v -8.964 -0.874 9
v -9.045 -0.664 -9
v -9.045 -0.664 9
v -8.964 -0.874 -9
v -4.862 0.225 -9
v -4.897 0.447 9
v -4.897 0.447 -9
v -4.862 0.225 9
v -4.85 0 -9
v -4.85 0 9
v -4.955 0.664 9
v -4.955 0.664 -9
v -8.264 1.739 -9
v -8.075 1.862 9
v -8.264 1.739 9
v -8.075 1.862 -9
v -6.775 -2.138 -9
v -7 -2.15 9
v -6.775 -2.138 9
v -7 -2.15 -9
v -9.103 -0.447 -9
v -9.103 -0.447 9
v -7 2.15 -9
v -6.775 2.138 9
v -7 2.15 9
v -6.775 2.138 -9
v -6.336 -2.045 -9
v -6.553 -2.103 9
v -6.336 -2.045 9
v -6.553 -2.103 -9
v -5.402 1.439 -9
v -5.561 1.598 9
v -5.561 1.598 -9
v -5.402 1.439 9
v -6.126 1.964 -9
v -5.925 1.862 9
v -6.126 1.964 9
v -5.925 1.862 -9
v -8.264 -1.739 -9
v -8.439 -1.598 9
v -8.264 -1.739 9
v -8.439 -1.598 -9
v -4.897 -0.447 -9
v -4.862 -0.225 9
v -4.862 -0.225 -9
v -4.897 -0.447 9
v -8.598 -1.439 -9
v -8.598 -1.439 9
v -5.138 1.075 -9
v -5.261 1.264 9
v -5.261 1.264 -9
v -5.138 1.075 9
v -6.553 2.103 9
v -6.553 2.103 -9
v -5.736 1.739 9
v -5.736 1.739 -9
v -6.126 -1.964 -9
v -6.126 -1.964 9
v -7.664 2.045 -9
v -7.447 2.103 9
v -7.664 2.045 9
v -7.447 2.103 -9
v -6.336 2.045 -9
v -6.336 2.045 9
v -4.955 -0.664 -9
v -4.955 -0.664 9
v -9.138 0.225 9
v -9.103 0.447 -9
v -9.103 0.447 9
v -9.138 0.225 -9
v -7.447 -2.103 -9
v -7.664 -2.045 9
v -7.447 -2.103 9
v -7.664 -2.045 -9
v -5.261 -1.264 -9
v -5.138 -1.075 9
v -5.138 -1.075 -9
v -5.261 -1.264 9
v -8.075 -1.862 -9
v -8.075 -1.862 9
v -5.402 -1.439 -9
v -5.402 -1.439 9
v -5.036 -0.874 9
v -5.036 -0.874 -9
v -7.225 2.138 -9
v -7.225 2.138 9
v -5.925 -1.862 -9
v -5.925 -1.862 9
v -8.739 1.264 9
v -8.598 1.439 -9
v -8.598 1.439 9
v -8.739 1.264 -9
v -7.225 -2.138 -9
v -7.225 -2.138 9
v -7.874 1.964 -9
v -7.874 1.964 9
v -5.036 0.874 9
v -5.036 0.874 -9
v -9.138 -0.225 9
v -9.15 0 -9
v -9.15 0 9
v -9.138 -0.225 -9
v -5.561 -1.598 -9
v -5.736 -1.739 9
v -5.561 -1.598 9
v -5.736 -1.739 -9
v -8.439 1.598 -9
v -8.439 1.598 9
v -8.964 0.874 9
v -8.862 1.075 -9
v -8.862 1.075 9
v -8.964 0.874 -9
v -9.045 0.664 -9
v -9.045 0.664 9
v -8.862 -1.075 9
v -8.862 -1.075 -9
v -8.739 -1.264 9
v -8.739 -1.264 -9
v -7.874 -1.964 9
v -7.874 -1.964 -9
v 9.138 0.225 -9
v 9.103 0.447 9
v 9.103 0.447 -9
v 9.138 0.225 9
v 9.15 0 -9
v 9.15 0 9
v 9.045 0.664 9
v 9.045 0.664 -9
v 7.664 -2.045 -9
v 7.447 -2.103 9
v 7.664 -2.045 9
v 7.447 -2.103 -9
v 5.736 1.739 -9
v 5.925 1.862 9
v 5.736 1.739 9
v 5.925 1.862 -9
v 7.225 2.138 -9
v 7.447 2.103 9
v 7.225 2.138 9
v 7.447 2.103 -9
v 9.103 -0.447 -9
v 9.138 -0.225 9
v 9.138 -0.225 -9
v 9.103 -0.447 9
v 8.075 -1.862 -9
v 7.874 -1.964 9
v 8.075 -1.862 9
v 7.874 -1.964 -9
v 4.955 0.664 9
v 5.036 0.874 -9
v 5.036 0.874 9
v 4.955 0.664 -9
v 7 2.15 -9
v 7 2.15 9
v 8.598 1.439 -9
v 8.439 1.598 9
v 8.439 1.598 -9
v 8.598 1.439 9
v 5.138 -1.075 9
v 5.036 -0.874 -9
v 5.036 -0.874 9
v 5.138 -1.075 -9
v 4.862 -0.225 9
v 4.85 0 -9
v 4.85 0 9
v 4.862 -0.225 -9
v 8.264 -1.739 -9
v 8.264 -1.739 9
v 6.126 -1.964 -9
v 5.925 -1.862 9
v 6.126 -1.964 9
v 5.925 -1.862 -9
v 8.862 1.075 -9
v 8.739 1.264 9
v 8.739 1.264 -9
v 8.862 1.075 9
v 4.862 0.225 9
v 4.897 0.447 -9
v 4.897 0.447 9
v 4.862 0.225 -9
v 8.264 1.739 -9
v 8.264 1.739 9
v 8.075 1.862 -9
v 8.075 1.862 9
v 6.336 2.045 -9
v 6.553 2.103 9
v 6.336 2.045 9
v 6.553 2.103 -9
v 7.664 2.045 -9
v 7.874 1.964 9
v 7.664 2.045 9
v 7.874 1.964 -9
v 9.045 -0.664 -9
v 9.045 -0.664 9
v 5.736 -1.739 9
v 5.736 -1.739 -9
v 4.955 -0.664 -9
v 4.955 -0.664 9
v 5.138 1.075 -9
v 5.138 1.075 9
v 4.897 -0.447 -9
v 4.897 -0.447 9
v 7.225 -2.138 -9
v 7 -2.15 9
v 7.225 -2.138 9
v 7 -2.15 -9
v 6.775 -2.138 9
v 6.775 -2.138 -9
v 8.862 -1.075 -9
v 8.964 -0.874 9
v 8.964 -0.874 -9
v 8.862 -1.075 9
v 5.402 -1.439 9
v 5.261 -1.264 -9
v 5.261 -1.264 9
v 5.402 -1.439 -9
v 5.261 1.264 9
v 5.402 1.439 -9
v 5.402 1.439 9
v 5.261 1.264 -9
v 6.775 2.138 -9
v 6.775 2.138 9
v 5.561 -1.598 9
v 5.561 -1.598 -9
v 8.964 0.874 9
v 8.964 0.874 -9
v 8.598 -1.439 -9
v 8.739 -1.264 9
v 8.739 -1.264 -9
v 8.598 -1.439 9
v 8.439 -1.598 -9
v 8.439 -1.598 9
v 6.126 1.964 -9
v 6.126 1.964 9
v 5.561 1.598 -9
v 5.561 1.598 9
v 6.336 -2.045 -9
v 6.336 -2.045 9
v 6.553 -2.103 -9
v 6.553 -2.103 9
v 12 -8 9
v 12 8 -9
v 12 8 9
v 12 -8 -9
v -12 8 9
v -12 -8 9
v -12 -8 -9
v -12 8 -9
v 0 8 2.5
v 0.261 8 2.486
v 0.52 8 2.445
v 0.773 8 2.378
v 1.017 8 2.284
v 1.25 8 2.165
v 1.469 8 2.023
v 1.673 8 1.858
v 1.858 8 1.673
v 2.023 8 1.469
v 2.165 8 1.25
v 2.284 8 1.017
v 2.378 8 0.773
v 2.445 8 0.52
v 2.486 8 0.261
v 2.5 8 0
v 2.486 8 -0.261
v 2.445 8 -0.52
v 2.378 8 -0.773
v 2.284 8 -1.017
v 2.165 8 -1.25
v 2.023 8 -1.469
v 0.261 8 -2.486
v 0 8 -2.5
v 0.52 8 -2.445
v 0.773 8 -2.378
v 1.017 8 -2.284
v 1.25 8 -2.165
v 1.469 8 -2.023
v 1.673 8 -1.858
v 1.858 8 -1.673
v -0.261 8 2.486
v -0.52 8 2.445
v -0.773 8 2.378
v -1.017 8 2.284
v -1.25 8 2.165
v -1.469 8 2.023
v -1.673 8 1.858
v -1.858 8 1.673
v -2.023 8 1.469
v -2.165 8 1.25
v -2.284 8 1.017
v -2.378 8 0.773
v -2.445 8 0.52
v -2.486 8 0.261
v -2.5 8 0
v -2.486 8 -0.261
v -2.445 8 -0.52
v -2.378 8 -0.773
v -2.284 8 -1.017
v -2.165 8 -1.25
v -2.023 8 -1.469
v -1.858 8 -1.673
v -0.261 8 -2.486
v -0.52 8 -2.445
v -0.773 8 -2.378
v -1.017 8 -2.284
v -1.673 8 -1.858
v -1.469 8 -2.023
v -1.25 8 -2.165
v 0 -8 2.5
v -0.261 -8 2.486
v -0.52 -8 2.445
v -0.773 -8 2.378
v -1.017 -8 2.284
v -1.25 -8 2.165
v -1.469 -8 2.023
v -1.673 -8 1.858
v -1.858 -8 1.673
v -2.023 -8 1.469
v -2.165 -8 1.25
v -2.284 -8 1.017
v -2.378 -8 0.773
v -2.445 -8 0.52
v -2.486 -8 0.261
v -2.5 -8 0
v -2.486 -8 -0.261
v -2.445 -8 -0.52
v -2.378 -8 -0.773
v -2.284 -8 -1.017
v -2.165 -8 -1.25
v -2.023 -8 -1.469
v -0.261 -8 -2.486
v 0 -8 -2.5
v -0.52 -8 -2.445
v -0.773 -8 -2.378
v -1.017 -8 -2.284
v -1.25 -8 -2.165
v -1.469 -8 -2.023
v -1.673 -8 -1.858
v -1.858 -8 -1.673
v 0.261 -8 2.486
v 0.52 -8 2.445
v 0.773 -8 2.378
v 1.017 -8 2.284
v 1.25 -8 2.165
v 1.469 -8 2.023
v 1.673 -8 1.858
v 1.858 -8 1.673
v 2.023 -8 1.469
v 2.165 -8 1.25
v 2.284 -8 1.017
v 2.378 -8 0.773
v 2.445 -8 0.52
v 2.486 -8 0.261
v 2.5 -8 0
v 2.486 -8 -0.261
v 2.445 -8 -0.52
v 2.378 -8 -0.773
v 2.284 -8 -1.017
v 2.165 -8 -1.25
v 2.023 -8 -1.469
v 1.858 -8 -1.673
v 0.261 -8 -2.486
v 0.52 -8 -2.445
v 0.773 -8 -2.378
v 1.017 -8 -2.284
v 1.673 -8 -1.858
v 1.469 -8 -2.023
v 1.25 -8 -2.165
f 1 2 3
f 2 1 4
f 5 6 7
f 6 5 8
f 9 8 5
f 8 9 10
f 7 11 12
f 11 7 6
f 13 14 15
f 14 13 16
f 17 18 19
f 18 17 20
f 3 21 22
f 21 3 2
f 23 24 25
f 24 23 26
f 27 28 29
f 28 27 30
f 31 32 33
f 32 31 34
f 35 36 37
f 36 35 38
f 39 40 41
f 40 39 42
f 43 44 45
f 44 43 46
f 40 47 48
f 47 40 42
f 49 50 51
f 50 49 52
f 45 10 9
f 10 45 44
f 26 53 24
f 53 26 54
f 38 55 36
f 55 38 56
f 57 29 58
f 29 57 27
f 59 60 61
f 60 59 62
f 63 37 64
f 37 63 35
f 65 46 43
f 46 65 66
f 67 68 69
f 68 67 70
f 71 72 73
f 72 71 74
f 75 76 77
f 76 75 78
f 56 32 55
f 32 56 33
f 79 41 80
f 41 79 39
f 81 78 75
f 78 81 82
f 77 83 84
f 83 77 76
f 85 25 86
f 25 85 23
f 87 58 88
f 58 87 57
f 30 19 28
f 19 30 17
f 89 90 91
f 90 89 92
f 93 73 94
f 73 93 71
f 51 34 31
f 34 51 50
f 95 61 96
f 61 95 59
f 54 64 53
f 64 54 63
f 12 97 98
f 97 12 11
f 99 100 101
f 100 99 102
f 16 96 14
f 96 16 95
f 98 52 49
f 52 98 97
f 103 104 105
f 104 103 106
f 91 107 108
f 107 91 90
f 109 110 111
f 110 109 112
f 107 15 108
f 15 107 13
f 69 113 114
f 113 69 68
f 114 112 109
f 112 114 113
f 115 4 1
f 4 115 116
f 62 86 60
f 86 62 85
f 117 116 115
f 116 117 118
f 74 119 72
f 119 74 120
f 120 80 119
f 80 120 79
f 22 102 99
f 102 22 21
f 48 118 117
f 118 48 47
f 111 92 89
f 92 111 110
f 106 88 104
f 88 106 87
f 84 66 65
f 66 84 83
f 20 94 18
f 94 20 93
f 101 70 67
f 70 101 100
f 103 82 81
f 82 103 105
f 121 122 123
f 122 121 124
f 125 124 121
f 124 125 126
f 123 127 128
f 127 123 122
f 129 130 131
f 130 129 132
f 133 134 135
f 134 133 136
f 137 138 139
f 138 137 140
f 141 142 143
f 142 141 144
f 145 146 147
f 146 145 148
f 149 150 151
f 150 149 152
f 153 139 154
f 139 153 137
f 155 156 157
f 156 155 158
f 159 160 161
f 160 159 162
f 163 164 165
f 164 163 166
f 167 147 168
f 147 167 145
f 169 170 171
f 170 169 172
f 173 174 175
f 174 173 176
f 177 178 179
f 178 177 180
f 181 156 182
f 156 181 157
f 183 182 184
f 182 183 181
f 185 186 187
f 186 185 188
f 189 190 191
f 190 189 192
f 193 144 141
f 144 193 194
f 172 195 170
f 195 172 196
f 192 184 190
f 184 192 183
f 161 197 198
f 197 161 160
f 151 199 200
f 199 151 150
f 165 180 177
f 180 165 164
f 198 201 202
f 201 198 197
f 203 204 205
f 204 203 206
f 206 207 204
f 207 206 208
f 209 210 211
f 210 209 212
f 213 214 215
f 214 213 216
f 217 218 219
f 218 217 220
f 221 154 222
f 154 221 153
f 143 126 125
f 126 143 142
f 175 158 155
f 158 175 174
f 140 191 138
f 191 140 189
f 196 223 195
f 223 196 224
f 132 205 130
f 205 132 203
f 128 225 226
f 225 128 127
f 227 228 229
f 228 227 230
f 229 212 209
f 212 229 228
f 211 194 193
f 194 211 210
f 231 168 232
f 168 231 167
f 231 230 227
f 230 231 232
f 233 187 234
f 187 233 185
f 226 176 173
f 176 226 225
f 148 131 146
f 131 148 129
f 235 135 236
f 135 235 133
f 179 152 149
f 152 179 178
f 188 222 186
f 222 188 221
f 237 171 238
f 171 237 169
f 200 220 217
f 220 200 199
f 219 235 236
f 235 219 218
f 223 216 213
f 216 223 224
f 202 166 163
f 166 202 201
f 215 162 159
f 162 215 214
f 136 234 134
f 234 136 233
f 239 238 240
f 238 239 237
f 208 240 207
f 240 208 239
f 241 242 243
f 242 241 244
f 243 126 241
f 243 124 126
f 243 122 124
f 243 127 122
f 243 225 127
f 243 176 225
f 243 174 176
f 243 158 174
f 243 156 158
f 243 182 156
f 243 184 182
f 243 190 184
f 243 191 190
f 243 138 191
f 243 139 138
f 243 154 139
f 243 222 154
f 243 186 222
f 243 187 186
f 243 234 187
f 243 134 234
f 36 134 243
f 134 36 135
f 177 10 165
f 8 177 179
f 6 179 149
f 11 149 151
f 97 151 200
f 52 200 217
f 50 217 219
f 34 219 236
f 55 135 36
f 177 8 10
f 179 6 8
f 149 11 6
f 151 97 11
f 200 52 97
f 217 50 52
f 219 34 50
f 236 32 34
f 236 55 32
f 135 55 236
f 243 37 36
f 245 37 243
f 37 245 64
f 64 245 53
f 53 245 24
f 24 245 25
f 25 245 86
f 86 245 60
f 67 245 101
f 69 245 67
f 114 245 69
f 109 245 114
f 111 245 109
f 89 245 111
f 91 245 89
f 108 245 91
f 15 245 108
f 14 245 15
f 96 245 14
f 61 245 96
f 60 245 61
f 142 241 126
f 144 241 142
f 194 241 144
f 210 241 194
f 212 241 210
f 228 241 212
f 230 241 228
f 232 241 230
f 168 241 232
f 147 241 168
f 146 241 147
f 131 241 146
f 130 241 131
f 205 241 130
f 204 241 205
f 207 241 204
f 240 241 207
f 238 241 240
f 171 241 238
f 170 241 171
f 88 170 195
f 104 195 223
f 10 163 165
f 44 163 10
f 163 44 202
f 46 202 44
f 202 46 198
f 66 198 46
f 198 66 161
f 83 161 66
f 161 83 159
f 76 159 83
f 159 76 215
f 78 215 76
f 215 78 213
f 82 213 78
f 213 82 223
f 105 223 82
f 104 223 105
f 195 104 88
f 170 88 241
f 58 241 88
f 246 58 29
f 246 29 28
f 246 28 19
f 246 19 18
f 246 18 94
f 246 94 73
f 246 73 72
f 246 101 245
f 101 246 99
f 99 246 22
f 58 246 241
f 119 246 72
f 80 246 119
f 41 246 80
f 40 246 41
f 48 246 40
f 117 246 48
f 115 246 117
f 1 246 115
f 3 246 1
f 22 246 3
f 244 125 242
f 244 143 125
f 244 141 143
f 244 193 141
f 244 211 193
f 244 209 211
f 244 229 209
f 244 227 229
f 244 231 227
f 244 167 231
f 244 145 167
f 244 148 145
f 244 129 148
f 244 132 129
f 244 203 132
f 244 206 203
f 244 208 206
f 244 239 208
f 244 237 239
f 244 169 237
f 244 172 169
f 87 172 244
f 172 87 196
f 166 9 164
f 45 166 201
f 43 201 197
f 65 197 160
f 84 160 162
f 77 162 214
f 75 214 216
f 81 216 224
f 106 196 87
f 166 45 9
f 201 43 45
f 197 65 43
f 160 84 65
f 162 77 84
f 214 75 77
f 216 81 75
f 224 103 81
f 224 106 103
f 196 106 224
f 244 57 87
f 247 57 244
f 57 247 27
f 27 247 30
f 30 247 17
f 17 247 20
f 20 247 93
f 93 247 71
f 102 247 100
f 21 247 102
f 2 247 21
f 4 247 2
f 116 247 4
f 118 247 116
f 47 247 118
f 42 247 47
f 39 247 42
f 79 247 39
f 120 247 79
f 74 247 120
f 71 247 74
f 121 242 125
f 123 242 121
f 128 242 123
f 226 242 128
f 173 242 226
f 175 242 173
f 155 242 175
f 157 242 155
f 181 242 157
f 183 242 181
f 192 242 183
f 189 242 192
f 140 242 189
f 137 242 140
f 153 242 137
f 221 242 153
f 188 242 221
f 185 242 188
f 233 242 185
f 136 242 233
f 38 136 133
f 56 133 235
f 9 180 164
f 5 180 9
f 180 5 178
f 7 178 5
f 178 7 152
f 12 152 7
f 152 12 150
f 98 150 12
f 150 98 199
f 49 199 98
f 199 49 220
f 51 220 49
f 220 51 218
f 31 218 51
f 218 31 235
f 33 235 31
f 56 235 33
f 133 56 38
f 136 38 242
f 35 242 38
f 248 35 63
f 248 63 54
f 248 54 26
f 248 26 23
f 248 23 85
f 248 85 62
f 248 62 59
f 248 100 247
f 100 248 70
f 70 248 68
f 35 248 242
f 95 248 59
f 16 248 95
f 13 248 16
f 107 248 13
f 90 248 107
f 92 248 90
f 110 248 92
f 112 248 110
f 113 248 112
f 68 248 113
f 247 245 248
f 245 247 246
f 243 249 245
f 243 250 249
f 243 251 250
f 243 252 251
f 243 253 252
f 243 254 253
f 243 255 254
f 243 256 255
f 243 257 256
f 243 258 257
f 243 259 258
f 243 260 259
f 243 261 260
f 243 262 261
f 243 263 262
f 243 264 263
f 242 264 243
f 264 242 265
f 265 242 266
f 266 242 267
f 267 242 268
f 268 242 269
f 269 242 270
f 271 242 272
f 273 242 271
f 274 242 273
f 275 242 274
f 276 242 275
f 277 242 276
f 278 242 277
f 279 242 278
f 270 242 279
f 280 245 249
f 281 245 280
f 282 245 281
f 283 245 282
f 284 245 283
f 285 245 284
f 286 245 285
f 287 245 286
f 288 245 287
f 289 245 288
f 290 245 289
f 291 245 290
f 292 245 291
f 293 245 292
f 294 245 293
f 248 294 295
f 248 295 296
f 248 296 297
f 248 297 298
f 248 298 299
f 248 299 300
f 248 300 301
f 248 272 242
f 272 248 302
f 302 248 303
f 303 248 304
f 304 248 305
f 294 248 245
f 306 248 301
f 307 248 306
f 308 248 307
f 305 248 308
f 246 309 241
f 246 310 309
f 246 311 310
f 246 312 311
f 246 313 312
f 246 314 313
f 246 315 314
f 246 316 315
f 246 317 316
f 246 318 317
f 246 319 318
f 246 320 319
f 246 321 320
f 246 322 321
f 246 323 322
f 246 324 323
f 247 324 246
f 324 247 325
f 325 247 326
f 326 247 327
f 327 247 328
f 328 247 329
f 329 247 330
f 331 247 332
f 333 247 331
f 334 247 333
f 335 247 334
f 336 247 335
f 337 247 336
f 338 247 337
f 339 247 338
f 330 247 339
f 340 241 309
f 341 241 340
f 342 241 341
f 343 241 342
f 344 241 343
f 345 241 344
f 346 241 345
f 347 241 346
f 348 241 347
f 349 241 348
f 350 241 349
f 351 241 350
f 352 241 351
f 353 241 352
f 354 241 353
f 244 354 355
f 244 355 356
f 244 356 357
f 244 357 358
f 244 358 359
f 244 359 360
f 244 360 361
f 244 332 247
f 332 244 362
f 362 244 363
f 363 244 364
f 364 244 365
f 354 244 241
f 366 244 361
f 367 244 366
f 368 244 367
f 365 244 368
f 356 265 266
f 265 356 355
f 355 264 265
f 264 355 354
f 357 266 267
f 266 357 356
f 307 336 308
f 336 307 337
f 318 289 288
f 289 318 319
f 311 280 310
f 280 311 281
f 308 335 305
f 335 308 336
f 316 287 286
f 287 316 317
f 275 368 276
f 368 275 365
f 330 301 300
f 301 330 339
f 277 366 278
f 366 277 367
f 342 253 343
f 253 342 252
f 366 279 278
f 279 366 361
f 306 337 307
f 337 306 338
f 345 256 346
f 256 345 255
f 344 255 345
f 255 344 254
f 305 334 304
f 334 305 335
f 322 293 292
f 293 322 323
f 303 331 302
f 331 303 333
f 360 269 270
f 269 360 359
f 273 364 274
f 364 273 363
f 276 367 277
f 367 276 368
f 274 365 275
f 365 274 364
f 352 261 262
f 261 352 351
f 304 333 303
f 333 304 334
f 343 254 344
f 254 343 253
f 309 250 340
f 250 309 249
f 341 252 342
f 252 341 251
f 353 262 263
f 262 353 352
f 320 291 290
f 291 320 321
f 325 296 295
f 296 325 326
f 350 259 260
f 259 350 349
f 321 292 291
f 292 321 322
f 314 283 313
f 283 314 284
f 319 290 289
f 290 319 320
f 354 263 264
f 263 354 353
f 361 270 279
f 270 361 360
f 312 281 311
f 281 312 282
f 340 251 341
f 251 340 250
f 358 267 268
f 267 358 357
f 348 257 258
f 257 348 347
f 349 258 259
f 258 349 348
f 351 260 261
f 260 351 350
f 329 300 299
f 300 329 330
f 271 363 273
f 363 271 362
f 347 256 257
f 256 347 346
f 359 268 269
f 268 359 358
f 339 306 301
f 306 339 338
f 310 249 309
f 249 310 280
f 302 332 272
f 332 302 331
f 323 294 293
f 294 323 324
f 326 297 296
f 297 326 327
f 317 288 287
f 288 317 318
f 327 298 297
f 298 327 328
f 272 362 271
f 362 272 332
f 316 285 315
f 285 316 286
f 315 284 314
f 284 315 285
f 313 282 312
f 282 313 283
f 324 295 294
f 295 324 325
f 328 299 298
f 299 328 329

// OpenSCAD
// Linear rail stop block.
$fn = 60;
eps = 0.02;
width = 16;
height = 18;
bore_d = 5;
length = 24;
difference() {
    cube([length,width,height],center=true);
    translate([0,-width/2-eps,0]) rotate([-90,0,0]) cylinder(d=bore_d,h=width+2*eps);
    for(x=[-7,7]) translate([x,0,-height/2-eps]) cylinder(d=4.3,h=height+2*eps);
}
